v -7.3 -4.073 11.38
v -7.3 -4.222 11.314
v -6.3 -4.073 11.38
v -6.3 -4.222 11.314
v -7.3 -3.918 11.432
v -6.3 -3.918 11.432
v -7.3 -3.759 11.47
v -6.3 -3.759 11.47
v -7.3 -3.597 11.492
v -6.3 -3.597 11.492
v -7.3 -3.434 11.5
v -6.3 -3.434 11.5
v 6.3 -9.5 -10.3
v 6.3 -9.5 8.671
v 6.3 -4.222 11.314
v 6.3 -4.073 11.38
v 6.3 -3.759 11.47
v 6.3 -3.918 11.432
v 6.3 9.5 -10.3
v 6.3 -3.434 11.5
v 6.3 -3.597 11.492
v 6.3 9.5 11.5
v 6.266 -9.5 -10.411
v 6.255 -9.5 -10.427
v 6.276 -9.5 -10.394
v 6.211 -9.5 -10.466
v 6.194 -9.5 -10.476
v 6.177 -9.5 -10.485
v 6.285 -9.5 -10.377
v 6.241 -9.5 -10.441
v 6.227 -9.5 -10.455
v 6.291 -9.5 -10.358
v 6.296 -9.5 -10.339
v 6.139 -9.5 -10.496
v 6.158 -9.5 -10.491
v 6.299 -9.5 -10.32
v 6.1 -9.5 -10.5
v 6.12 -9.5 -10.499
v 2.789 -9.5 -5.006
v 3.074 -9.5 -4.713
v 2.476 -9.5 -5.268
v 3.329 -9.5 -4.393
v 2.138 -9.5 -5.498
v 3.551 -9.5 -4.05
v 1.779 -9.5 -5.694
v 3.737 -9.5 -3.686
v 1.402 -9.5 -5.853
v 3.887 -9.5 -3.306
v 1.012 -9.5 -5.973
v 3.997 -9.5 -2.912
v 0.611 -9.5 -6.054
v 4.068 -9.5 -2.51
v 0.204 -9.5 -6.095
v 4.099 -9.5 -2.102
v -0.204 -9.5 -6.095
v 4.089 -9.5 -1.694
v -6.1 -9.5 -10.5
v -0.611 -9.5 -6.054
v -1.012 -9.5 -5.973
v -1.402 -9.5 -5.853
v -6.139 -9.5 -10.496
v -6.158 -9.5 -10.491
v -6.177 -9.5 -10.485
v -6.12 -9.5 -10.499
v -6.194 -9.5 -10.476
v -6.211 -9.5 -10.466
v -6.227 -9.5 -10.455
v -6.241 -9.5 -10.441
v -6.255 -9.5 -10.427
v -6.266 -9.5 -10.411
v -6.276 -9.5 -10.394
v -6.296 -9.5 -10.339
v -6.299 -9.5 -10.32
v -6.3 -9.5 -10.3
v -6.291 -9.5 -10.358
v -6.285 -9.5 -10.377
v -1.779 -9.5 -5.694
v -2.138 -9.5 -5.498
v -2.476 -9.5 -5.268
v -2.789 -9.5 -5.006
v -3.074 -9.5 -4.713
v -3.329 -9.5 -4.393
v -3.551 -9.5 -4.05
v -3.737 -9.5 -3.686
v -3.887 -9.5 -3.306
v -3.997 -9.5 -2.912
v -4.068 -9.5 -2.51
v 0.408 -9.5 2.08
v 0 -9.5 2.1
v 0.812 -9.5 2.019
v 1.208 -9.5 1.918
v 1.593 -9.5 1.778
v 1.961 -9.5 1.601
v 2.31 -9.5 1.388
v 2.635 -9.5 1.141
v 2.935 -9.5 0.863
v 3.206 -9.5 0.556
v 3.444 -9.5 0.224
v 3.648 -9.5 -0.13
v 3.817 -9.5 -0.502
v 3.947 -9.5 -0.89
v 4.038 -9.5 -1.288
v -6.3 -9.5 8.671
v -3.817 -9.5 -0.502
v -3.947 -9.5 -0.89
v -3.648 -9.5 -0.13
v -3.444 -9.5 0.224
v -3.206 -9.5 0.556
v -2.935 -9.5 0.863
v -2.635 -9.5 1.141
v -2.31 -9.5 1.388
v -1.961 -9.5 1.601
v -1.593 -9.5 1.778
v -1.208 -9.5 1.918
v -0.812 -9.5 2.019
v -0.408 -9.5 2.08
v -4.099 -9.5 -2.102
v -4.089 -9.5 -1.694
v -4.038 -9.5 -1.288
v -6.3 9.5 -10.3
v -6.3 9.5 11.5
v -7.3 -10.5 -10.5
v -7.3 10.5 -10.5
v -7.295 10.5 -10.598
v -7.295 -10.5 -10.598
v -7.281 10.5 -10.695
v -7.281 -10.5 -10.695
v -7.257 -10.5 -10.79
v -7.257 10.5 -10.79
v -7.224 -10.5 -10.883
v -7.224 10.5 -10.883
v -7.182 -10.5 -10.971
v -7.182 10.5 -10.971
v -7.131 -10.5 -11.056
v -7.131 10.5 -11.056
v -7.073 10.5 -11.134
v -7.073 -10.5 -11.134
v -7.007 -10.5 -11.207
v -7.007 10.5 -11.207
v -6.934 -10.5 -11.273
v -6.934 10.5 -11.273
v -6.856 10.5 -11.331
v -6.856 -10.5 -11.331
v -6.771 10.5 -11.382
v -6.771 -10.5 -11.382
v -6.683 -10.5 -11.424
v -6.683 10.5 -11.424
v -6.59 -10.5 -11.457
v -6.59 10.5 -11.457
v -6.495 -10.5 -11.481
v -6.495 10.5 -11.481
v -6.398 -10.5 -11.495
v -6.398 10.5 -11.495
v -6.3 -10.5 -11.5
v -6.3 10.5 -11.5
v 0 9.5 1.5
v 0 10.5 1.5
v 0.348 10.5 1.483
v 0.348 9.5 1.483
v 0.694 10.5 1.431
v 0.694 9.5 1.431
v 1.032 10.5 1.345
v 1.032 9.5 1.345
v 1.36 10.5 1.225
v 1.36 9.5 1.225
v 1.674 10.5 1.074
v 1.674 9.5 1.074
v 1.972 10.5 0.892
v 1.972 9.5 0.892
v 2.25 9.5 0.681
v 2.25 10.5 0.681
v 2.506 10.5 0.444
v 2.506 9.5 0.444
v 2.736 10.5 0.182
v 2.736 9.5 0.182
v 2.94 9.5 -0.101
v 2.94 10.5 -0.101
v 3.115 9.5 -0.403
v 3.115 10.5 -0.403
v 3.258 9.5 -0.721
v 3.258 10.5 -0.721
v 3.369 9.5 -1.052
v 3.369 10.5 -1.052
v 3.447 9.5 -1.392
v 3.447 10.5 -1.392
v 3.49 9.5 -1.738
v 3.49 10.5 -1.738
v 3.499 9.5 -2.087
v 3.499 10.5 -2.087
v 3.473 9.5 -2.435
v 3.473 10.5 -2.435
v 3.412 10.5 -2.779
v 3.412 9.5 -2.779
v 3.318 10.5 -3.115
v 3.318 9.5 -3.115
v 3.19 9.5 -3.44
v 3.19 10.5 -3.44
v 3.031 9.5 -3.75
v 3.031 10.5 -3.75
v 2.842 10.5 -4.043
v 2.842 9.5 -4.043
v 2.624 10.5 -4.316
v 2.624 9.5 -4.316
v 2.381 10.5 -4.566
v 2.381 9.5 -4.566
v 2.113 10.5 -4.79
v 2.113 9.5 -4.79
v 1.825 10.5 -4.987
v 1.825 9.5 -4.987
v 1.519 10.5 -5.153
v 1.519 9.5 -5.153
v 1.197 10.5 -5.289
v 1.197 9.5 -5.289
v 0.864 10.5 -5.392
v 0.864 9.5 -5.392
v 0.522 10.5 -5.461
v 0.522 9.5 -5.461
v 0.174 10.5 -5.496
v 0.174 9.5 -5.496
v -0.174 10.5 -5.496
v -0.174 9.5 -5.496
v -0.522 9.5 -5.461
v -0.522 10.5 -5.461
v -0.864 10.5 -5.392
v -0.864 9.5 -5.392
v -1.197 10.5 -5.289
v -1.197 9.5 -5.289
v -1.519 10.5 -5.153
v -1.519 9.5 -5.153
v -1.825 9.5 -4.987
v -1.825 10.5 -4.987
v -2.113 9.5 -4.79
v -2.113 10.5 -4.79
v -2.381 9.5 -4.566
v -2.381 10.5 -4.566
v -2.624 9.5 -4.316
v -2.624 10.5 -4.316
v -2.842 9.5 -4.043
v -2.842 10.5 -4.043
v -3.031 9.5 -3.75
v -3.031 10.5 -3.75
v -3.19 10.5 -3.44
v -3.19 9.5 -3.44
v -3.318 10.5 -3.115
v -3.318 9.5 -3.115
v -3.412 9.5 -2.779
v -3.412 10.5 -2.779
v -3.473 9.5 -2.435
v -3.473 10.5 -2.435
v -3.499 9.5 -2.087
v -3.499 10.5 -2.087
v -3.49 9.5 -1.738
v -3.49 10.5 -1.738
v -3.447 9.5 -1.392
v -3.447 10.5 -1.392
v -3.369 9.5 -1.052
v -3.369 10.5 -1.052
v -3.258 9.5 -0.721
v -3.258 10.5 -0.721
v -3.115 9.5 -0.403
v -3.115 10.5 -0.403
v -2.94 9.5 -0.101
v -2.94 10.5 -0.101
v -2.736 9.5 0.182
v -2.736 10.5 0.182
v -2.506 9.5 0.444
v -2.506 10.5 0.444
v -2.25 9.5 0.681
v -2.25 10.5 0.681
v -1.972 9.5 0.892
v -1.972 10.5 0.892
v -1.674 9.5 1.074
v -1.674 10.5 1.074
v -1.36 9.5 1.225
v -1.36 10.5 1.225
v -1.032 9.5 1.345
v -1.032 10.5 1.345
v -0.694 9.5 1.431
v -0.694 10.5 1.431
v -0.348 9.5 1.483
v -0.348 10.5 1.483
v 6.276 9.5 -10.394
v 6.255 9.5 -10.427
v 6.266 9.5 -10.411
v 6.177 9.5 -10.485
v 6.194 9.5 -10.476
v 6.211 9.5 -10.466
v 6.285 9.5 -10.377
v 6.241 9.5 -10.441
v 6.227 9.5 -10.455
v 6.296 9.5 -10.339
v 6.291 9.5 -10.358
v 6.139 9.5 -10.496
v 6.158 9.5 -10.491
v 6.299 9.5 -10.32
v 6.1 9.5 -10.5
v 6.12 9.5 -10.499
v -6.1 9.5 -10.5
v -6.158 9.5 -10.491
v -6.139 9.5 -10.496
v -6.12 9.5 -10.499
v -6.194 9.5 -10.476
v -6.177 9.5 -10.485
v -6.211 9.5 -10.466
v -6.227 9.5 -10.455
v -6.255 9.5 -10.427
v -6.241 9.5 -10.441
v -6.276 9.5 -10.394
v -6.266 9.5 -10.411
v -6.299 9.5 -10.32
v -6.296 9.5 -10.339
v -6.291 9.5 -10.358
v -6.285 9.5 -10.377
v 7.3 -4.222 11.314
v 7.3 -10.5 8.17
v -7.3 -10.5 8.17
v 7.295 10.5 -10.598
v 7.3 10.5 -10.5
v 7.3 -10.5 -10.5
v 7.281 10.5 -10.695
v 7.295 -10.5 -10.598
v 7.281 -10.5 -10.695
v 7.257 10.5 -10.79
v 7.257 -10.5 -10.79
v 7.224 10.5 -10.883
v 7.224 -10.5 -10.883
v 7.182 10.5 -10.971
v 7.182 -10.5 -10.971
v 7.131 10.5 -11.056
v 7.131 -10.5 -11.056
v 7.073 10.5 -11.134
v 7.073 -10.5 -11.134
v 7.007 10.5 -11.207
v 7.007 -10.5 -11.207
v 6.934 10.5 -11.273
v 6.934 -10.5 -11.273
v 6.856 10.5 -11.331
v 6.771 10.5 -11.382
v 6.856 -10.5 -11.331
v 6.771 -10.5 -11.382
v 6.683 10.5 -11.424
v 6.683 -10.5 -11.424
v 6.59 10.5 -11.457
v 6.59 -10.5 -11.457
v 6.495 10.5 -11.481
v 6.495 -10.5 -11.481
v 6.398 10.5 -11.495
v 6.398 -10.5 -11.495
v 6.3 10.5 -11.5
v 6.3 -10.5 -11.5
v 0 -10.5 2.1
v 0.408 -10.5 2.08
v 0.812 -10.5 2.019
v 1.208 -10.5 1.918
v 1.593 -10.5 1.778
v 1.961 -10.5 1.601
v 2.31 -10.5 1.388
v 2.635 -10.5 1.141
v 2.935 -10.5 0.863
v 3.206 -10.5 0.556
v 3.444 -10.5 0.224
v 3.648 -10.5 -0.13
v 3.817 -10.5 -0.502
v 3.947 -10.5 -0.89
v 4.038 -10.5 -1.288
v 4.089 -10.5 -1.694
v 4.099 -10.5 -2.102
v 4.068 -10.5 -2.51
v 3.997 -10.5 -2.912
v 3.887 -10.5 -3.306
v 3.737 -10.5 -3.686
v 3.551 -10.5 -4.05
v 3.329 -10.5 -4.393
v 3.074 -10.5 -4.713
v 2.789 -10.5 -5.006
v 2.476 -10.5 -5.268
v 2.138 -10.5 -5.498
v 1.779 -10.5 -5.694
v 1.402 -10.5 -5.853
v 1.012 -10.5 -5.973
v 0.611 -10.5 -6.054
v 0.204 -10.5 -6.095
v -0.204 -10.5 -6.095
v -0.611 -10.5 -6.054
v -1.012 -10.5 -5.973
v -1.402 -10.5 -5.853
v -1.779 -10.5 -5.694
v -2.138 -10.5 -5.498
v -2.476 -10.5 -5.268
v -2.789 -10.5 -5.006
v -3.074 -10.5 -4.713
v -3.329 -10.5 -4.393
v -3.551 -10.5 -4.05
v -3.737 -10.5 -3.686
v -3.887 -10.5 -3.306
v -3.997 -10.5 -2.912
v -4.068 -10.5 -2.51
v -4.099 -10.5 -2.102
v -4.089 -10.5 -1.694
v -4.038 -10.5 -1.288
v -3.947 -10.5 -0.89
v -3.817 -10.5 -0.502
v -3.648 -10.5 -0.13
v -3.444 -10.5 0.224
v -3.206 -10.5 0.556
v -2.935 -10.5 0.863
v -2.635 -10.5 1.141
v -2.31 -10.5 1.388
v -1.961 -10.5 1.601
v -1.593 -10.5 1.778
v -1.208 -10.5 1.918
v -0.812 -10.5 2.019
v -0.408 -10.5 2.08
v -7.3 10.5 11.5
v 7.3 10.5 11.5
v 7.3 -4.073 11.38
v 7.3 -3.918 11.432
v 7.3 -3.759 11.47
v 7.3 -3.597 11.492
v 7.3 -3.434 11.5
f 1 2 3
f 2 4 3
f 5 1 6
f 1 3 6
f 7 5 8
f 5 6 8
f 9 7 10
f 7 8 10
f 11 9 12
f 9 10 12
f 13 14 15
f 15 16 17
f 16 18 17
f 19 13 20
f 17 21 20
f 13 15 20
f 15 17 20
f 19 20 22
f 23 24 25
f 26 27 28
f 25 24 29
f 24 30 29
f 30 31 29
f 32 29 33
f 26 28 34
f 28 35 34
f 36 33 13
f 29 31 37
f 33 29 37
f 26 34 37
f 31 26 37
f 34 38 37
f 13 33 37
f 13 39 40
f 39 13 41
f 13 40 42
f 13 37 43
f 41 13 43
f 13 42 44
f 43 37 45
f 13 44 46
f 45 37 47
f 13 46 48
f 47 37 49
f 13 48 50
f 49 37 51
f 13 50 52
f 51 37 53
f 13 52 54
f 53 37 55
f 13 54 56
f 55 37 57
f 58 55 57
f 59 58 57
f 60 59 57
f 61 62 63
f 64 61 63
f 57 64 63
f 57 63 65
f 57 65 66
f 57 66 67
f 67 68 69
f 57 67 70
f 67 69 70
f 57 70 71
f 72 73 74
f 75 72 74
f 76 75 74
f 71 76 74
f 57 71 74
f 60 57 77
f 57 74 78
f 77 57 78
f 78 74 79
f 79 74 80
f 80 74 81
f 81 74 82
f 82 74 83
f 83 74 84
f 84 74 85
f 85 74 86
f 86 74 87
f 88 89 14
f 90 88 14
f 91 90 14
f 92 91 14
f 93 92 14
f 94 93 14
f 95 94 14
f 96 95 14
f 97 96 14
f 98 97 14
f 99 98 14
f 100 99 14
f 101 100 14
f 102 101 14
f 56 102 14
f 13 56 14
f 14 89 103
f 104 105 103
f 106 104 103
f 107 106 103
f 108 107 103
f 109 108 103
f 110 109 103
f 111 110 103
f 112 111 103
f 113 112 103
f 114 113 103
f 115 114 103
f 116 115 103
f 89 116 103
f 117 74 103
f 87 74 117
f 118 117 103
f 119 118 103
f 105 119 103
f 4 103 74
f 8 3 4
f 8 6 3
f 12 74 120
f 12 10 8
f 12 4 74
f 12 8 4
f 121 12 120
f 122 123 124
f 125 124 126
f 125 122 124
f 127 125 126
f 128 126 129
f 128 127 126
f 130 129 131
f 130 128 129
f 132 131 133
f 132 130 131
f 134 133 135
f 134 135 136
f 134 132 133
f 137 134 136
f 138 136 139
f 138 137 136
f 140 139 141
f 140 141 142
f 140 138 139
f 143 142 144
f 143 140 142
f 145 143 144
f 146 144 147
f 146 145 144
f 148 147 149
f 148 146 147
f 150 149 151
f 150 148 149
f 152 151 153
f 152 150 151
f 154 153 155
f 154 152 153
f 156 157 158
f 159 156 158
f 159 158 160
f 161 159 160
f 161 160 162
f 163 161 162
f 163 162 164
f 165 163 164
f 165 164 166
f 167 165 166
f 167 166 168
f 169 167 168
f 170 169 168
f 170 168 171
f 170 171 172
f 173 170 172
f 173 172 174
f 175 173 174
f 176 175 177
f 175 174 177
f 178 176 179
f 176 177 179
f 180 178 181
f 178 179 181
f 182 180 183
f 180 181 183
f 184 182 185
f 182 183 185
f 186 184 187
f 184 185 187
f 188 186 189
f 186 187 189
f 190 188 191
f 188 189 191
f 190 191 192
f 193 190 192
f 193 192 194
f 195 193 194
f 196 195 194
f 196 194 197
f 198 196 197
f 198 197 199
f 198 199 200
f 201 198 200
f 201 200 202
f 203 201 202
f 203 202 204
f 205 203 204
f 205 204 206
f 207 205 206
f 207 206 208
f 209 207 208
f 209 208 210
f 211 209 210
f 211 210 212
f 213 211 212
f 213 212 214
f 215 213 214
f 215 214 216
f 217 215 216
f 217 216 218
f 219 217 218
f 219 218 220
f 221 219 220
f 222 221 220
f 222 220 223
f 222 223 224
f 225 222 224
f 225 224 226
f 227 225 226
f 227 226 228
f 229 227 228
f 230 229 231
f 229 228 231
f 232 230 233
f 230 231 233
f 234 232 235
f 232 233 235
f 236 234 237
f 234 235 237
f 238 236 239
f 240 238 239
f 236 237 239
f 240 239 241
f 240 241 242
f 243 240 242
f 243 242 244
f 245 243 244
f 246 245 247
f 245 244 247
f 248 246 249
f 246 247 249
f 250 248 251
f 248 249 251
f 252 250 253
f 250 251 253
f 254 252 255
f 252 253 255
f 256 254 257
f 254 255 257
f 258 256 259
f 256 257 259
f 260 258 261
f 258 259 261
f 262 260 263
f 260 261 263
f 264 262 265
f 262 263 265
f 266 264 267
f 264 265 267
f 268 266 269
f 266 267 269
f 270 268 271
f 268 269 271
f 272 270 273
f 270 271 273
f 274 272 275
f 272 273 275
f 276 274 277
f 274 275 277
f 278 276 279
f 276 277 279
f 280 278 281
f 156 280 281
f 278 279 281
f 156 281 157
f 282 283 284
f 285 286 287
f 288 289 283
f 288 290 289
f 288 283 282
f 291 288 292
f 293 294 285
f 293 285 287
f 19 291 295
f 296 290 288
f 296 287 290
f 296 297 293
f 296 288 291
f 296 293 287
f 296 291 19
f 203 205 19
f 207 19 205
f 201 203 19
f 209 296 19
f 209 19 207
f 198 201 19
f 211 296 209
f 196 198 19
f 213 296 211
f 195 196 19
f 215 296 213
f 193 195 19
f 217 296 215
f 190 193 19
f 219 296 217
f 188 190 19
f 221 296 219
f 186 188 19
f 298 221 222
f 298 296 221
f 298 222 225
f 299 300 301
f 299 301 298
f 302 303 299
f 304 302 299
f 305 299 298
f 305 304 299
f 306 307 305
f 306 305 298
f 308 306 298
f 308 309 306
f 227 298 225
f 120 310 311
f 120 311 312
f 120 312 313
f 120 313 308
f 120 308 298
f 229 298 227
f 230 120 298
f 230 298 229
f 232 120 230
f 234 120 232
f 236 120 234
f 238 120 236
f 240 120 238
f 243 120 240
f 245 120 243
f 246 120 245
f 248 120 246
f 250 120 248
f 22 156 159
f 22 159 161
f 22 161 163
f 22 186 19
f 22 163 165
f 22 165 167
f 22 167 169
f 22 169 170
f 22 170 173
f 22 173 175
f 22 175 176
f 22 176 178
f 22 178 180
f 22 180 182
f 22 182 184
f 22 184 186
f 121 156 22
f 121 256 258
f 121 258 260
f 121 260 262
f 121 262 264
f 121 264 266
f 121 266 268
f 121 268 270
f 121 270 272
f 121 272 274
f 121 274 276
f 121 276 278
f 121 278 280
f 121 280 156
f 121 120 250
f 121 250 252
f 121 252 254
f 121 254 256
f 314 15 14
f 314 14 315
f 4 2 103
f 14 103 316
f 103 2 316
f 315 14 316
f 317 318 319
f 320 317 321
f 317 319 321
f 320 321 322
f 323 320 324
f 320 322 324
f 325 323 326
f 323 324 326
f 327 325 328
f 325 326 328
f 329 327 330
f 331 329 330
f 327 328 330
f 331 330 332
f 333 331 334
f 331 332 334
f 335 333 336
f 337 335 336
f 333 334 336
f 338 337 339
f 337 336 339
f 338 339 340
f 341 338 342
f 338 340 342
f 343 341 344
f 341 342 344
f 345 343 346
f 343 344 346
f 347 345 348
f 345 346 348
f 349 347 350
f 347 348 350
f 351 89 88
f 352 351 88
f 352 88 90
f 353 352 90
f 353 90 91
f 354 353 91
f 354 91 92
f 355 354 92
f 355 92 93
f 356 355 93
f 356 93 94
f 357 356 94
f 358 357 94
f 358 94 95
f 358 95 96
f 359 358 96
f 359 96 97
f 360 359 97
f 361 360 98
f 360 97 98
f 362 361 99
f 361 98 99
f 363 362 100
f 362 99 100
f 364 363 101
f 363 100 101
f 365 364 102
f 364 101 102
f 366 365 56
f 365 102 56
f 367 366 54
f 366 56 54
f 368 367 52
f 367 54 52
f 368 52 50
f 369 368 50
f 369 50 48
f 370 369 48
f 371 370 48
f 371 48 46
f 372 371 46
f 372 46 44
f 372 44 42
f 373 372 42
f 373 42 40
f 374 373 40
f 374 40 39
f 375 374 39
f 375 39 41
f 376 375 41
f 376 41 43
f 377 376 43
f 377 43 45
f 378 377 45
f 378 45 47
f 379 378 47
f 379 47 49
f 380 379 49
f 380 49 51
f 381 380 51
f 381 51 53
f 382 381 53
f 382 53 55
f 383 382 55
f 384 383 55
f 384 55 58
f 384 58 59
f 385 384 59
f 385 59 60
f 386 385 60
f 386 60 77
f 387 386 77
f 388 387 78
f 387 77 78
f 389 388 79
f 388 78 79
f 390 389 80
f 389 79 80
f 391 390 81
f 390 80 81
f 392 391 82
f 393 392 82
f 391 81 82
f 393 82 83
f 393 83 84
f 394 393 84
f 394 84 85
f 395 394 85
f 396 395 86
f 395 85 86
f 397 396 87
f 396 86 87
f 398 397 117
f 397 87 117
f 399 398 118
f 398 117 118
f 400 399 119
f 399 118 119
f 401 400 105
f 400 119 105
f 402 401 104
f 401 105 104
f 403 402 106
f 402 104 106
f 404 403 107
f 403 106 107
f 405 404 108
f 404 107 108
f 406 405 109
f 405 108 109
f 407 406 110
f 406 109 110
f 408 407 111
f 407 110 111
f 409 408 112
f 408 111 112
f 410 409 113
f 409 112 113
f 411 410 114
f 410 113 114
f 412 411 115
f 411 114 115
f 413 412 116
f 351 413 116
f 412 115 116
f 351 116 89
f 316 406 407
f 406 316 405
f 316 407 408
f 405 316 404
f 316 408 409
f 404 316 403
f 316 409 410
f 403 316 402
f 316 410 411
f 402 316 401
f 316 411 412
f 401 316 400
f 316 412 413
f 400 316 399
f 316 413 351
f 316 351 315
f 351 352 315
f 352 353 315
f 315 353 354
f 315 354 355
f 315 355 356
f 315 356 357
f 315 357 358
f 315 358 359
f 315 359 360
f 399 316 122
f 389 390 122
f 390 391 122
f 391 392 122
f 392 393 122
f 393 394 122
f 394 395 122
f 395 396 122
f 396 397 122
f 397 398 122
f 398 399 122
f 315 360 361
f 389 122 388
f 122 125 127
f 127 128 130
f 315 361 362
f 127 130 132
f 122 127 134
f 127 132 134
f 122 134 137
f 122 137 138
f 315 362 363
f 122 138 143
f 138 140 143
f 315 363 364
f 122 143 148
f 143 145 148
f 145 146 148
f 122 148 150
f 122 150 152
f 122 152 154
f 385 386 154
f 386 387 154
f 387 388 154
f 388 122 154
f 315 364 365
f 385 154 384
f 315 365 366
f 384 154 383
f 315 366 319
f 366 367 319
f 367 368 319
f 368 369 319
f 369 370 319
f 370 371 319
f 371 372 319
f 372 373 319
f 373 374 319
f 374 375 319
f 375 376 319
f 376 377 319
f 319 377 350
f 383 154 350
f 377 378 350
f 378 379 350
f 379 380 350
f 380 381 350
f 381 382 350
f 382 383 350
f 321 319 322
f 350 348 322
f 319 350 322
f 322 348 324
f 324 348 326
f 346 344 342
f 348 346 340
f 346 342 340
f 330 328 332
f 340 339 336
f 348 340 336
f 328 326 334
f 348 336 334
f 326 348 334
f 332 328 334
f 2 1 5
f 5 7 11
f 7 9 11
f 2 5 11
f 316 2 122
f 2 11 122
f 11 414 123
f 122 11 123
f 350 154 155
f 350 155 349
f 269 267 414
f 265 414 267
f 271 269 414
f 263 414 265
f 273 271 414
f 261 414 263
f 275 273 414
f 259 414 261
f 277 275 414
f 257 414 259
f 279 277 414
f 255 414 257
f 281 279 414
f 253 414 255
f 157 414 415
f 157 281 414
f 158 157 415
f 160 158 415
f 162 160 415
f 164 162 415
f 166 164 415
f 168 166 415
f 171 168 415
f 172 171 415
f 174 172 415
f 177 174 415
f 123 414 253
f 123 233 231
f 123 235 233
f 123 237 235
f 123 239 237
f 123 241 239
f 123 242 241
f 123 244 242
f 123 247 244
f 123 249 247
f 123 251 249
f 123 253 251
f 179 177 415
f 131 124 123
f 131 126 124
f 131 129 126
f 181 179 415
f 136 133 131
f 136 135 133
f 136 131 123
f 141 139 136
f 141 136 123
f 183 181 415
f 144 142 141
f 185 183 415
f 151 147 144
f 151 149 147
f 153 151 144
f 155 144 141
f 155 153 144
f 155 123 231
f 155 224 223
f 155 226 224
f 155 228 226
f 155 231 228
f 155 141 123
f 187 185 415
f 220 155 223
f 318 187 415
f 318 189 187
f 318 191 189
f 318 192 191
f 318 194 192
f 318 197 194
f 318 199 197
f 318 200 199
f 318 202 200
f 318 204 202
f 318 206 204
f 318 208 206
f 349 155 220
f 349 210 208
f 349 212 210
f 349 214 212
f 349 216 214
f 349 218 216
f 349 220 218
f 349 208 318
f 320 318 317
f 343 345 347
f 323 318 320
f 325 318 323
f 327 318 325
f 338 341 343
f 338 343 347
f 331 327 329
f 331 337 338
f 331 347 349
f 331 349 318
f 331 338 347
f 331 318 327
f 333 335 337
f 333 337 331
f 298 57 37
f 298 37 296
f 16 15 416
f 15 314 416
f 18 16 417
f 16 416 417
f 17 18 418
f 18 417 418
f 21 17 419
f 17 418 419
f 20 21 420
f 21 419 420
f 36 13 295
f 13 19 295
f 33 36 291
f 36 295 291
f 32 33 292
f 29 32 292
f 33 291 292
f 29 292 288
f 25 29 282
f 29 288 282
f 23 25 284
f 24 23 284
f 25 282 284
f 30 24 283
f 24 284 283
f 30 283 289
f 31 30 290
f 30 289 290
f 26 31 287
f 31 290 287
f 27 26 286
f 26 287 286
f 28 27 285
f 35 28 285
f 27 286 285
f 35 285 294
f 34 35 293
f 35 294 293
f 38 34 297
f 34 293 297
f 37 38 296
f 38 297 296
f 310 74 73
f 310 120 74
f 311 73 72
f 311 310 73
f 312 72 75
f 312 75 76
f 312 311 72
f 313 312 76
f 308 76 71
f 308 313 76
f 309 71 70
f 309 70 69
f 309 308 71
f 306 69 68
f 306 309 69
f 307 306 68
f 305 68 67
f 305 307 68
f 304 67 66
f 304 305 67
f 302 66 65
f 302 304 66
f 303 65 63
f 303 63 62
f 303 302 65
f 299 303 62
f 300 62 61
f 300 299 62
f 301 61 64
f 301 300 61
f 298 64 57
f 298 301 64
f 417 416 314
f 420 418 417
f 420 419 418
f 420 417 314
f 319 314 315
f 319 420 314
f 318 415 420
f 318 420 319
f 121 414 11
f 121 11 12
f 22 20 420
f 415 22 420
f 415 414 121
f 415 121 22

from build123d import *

# Parameters (mm, degrees)
MAINBODYS_W          = 14.6
MAINBODYS_H          = 23
MAIN_BODY_DEPTH      = 10.5
MB_FILLET_R          = 1
SHELL_START          = -6.3
SHELL_MB_OUTLINE_W   = 19
SHELL_MB_OUTLINE_H   = 22
SHELL_MB_DEPTH       = 12.6
TOP_BORE_REACH       = 27.031
TOPBORES_R           = 3.5
BOTTOMBORES_R        = 4.1
BOTTOM_BORE_DEPTH    = 25.197933796
ANGLEDCUT_DEPTH      = 18.19854645
ANGLEDCUT_DEPTH_BACK = 18.19854645
MB_INNER_FILLET_R    = 0.2
AC_F_R               = 1.76


# Read off the part's stored shape, not the designer's step: SHELL MB
with BuildPart() as part:
    # MainBodyS → MAIN BODY (new, symmetric)
    with BuildSketch(Plane(origin=(0, 0, 0), x_dir=(1, 0, 0), z_dir=(0, 1, 0))):
        Rectangle(MAINBODYS_W, MAINBODYS_H)
    extrude(amount=MAIN_BODY_DEPTH, both=True)

    # MB FILLET
    mb_fillet_edges = [part.edges().sort_by_distance(p)[0] for p in [
        (-7.3, 0, -11.5),
        (7.3, 0, -11.5),
    ]]
    fillet(mb_fillet_edges, radius=MB_FILLET_R)

    # SHELL MB outline → SHELL MB (cut)
    with BuildSketch(Plane.YZ.offset(SHELL_START)):
        with Locations((0, 0.5)):
            Rectangle(SHELL_MB_OUTLINE_W, SHELL_MB_OUTLINE_H)
    extrude(amount=SHELL_MB_DEPTH, mode=Mode.SUBTRACT)

    # TopBoreS → TOP BORE (cut, up to next)
    with BuildSketch(Plane(origin=(0, 10.5, 0), x_dir=(1, 0, 0), z_dir=(0, 1, 0)), mode=Mode.PRIVATE) as top_bore_sk1:
        with Locations(Location((0, 2, 0), (0, 0, 270))):
            Circle(TOPBORES_R)
    top_bore_tool1 = extrude(top_bore_sk1.sketch, amount=-TOP_BORE_REACH, mode=Mode.PRIVATE) & part.part
    add(top_bore_tool1.solids().sort_by_distance((0, 10.5, -2))[0], mode=Mode.SUBTRACT)

    # BottomBoreS → BOTTOM BORE (cut, through all)
    with BuildSketch(Plane(origin=(0, -9.5, 0), x_dir=(1, 0, 0), z_dir=(0, 1, 0))):
        with Locations(Location((0, 2, 0), (0, 0, 270))):
            Circle(BOTTOMBORES_R)
    extrude(amount=-BOTTOM_BORE_DEPTH, mode=Mode.SUBTRACT)

    # AngledCutS → AngledCut (cut, two sides: drawn at the far end of the back side and taken through both)
    with BuildSketch(Plane(origin=(0, 0, 0), x_dir=(0, 0, -1), z_dir=(1, 0, 0)).offset(-ANGLEDCUT_DEPTH_BACK)):
        Polygon((-41.74417665, 56.547529947), (-11.5, -3.85), (-8.17, -10.5), (22.07417665, -70.897529947), (-98.720883244, -131.385883248), (-162.539236545, -3.940823353), align=None)
    extrude(amount=ANGLEDCUT_DEPTH + ANGLEDCUT_DEPTH_BACK, mode=Mode.SUBTRACT)

    # MB INNER FILLET
    mb_inner_fillet_edges = [part.edges().sort_by_distance(p)[0] for p in [
        (6.3, 0, -10.5),
        (-6.3, 0, -10.5),
    ]]
    fillet(mb_inner_fillet_edges, radius=MB_INNER_FILLET_R)

    # AC F
    ac_f_edges = [part.edges().sort_by_distance(p)[0] for p in [
        (-6.8, -3.85, 11.5),
        (6.8, -3.85, 11.5),
    ]]
    fillet(ac_f_edges, radius=AC_F_R)


solid = part.part
